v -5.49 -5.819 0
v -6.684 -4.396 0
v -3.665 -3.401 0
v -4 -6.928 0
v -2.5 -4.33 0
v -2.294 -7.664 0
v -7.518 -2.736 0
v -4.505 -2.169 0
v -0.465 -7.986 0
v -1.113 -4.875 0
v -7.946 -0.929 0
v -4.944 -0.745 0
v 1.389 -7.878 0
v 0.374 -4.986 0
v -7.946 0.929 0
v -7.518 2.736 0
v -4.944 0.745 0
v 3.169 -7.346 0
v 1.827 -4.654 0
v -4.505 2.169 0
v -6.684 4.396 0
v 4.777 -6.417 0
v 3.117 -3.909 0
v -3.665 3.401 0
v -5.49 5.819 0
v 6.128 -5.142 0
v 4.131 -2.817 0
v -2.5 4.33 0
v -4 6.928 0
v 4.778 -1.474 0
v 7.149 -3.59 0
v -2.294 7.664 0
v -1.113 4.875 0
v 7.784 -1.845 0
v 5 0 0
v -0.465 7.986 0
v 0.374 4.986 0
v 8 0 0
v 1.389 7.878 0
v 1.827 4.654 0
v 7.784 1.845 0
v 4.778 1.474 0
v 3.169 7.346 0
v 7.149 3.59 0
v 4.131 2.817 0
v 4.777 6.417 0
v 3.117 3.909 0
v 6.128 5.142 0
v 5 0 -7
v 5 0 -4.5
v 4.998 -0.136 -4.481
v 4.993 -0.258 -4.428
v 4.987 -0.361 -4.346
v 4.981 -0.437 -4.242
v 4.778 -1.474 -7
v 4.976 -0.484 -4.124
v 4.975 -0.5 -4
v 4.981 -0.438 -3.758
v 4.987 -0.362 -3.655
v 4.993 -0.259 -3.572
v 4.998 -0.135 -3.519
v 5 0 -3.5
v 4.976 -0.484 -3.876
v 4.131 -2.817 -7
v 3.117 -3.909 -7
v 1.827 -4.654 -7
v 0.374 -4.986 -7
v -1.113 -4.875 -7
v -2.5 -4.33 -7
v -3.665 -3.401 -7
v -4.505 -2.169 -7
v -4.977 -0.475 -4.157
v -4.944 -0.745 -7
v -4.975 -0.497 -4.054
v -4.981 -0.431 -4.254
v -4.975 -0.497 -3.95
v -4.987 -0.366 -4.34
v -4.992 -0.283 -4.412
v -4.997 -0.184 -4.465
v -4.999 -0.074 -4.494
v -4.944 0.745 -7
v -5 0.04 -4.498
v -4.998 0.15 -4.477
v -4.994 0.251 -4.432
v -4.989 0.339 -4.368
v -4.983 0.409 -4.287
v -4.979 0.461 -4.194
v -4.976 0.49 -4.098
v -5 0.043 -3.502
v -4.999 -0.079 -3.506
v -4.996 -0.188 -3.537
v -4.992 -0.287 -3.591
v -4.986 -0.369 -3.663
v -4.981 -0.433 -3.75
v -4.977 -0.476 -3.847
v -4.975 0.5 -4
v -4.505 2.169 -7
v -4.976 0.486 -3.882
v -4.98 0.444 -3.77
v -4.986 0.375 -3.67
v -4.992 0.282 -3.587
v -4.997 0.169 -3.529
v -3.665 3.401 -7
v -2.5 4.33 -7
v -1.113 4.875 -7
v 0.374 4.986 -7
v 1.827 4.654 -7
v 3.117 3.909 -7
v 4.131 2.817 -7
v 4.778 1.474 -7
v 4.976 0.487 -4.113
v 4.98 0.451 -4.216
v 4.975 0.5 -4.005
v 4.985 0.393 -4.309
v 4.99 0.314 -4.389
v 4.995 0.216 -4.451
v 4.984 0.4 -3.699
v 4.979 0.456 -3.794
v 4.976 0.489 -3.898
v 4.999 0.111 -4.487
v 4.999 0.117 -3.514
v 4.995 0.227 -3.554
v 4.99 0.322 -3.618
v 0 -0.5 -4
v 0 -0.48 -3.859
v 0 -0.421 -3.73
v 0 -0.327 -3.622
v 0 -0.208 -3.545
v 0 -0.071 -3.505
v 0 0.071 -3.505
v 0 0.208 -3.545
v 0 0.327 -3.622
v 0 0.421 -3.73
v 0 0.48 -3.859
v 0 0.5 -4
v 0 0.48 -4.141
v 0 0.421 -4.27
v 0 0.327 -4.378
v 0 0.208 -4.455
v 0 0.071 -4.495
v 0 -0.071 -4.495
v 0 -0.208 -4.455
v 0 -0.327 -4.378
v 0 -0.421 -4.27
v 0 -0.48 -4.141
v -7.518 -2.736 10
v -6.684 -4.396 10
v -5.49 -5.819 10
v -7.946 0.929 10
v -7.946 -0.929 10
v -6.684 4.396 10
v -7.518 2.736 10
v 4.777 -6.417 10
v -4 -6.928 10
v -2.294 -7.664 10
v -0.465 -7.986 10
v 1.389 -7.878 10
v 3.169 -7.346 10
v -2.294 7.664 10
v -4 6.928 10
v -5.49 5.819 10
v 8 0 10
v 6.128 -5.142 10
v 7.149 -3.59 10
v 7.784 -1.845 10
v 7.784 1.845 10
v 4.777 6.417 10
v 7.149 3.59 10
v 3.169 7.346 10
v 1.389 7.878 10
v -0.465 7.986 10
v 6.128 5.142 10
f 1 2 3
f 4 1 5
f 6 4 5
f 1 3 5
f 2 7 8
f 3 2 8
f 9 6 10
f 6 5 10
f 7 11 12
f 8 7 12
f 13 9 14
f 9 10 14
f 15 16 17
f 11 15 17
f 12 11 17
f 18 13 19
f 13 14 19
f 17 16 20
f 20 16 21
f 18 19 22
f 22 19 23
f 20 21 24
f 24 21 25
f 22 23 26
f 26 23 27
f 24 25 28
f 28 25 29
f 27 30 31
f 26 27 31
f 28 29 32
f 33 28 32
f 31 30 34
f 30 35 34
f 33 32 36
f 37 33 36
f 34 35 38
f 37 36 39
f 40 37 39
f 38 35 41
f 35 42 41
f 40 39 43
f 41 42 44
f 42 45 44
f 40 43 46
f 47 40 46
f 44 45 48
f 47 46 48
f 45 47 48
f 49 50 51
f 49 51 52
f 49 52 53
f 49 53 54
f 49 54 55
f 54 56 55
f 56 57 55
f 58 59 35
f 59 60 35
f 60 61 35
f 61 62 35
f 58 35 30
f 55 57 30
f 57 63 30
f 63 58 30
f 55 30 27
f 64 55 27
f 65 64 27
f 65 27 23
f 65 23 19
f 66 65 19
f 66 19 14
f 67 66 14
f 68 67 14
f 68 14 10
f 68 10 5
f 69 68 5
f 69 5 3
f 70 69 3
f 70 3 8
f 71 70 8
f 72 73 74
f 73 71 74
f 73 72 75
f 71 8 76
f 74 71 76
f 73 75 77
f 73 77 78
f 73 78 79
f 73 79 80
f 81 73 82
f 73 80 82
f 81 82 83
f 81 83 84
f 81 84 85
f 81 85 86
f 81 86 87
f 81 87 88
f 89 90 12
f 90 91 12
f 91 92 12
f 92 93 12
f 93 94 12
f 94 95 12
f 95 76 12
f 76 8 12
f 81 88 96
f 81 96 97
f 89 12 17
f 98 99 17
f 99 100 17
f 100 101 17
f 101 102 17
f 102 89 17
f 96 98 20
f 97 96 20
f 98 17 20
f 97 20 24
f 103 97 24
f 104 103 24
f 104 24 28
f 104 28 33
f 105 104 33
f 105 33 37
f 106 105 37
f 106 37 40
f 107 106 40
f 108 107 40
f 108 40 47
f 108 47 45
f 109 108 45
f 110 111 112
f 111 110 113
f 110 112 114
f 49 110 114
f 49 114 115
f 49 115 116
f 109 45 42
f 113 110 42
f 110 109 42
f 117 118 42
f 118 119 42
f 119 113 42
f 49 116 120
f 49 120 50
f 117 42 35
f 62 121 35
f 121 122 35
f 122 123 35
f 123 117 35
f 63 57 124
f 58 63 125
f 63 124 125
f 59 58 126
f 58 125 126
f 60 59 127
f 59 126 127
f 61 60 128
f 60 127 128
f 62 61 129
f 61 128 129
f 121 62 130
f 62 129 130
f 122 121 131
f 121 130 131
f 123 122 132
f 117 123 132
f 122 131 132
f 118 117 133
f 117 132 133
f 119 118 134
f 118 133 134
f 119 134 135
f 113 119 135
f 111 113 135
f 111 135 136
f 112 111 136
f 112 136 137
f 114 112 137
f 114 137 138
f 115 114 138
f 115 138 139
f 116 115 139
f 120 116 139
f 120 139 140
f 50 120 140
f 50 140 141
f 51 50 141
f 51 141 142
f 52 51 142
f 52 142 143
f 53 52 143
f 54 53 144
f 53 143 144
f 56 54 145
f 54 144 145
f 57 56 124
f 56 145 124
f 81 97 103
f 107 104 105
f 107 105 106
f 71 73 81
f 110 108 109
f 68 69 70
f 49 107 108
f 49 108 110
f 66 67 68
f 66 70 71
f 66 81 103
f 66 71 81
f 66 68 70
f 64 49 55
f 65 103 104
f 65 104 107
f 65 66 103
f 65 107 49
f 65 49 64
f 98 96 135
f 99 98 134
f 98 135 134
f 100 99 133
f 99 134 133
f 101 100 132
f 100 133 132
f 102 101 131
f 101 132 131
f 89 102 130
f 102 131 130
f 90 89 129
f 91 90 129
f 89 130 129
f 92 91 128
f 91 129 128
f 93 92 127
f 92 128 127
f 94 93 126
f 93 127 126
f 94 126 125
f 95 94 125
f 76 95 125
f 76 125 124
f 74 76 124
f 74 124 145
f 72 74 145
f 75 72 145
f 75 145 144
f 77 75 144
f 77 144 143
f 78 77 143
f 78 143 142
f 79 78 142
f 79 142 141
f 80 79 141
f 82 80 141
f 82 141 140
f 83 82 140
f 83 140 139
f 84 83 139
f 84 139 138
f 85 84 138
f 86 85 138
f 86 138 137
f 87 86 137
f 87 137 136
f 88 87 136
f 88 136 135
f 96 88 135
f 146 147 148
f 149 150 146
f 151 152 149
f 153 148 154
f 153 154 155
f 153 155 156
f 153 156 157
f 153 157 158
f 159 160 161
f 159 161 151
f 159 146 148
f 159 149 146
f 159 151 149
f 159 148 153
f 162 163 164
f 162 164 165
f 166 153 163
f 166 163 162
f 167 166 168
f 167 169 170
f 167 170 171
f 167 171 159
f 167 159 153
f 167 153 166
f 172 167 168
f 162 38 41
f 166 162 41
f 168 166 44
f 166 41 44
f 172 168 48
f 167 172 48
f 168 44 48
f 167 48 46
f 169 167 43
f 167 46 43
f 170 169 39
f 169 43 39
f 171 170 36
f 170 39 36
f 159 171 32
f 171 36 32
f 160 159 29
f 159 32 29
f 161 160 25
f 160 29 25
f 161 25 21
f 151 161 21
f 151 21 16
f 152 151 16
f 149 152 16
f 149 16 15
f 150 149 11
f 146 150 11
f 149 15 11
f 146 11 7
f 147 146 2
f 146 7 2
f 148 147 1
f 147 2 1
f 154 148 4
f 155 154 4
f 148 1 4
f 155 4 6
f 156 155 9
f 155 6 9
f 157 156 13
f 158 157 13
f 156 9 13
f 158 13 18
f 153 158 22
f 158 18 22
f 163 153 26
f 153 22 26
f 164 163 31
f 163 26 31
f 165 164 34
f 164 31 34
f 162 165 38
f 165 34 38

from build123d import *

# Parameters (mm, degrees)
F0_R     = 8
F1_DEPTH = 10
F2_R     = 5
F3_DEPTH = 7
F4_R     = 0.5
F5_DEPTH = 25
F6_R     = 0.5
F7_DEPTH = 25


with BuildPart() as f1:
    # F0 (on Top) → F1 (new body)
    with BuildSketch(Plane.XY):
        Circle(F0_R)
    extrude(amount=F1_DEPTH)

    # F2 (on face) → F3 (join)
    with BuildSketch(Plane(origin=(0, 0, 0), x_dir=(1, 0, 0), z_dir=(0, 0, -1))):
        Circle(F2_R)
    extrude(amount=F3_DEPTH)

    # F4 (on Right) → F5 (cut)
    with BuildSketch(Plane.YZ):
        with Locations((0, -4)):
            Circle(F4_R)
    extrude(amount=-F5_DEPTH, mode=Mode.SUBTRACT)

    # F6 (on face) → F7 (cut)
    with BuildSketch(Plane(origin=(0, 0, 0), x_dir=(0, -1, 0), z_dir=(-1, 0, 0))):
        with Locations((0, -4)):
            Circle(F6_R)
    extrude(amount=-F7_DEPTH, mode=Mode.SUBTRACT)


solid = f1.part
